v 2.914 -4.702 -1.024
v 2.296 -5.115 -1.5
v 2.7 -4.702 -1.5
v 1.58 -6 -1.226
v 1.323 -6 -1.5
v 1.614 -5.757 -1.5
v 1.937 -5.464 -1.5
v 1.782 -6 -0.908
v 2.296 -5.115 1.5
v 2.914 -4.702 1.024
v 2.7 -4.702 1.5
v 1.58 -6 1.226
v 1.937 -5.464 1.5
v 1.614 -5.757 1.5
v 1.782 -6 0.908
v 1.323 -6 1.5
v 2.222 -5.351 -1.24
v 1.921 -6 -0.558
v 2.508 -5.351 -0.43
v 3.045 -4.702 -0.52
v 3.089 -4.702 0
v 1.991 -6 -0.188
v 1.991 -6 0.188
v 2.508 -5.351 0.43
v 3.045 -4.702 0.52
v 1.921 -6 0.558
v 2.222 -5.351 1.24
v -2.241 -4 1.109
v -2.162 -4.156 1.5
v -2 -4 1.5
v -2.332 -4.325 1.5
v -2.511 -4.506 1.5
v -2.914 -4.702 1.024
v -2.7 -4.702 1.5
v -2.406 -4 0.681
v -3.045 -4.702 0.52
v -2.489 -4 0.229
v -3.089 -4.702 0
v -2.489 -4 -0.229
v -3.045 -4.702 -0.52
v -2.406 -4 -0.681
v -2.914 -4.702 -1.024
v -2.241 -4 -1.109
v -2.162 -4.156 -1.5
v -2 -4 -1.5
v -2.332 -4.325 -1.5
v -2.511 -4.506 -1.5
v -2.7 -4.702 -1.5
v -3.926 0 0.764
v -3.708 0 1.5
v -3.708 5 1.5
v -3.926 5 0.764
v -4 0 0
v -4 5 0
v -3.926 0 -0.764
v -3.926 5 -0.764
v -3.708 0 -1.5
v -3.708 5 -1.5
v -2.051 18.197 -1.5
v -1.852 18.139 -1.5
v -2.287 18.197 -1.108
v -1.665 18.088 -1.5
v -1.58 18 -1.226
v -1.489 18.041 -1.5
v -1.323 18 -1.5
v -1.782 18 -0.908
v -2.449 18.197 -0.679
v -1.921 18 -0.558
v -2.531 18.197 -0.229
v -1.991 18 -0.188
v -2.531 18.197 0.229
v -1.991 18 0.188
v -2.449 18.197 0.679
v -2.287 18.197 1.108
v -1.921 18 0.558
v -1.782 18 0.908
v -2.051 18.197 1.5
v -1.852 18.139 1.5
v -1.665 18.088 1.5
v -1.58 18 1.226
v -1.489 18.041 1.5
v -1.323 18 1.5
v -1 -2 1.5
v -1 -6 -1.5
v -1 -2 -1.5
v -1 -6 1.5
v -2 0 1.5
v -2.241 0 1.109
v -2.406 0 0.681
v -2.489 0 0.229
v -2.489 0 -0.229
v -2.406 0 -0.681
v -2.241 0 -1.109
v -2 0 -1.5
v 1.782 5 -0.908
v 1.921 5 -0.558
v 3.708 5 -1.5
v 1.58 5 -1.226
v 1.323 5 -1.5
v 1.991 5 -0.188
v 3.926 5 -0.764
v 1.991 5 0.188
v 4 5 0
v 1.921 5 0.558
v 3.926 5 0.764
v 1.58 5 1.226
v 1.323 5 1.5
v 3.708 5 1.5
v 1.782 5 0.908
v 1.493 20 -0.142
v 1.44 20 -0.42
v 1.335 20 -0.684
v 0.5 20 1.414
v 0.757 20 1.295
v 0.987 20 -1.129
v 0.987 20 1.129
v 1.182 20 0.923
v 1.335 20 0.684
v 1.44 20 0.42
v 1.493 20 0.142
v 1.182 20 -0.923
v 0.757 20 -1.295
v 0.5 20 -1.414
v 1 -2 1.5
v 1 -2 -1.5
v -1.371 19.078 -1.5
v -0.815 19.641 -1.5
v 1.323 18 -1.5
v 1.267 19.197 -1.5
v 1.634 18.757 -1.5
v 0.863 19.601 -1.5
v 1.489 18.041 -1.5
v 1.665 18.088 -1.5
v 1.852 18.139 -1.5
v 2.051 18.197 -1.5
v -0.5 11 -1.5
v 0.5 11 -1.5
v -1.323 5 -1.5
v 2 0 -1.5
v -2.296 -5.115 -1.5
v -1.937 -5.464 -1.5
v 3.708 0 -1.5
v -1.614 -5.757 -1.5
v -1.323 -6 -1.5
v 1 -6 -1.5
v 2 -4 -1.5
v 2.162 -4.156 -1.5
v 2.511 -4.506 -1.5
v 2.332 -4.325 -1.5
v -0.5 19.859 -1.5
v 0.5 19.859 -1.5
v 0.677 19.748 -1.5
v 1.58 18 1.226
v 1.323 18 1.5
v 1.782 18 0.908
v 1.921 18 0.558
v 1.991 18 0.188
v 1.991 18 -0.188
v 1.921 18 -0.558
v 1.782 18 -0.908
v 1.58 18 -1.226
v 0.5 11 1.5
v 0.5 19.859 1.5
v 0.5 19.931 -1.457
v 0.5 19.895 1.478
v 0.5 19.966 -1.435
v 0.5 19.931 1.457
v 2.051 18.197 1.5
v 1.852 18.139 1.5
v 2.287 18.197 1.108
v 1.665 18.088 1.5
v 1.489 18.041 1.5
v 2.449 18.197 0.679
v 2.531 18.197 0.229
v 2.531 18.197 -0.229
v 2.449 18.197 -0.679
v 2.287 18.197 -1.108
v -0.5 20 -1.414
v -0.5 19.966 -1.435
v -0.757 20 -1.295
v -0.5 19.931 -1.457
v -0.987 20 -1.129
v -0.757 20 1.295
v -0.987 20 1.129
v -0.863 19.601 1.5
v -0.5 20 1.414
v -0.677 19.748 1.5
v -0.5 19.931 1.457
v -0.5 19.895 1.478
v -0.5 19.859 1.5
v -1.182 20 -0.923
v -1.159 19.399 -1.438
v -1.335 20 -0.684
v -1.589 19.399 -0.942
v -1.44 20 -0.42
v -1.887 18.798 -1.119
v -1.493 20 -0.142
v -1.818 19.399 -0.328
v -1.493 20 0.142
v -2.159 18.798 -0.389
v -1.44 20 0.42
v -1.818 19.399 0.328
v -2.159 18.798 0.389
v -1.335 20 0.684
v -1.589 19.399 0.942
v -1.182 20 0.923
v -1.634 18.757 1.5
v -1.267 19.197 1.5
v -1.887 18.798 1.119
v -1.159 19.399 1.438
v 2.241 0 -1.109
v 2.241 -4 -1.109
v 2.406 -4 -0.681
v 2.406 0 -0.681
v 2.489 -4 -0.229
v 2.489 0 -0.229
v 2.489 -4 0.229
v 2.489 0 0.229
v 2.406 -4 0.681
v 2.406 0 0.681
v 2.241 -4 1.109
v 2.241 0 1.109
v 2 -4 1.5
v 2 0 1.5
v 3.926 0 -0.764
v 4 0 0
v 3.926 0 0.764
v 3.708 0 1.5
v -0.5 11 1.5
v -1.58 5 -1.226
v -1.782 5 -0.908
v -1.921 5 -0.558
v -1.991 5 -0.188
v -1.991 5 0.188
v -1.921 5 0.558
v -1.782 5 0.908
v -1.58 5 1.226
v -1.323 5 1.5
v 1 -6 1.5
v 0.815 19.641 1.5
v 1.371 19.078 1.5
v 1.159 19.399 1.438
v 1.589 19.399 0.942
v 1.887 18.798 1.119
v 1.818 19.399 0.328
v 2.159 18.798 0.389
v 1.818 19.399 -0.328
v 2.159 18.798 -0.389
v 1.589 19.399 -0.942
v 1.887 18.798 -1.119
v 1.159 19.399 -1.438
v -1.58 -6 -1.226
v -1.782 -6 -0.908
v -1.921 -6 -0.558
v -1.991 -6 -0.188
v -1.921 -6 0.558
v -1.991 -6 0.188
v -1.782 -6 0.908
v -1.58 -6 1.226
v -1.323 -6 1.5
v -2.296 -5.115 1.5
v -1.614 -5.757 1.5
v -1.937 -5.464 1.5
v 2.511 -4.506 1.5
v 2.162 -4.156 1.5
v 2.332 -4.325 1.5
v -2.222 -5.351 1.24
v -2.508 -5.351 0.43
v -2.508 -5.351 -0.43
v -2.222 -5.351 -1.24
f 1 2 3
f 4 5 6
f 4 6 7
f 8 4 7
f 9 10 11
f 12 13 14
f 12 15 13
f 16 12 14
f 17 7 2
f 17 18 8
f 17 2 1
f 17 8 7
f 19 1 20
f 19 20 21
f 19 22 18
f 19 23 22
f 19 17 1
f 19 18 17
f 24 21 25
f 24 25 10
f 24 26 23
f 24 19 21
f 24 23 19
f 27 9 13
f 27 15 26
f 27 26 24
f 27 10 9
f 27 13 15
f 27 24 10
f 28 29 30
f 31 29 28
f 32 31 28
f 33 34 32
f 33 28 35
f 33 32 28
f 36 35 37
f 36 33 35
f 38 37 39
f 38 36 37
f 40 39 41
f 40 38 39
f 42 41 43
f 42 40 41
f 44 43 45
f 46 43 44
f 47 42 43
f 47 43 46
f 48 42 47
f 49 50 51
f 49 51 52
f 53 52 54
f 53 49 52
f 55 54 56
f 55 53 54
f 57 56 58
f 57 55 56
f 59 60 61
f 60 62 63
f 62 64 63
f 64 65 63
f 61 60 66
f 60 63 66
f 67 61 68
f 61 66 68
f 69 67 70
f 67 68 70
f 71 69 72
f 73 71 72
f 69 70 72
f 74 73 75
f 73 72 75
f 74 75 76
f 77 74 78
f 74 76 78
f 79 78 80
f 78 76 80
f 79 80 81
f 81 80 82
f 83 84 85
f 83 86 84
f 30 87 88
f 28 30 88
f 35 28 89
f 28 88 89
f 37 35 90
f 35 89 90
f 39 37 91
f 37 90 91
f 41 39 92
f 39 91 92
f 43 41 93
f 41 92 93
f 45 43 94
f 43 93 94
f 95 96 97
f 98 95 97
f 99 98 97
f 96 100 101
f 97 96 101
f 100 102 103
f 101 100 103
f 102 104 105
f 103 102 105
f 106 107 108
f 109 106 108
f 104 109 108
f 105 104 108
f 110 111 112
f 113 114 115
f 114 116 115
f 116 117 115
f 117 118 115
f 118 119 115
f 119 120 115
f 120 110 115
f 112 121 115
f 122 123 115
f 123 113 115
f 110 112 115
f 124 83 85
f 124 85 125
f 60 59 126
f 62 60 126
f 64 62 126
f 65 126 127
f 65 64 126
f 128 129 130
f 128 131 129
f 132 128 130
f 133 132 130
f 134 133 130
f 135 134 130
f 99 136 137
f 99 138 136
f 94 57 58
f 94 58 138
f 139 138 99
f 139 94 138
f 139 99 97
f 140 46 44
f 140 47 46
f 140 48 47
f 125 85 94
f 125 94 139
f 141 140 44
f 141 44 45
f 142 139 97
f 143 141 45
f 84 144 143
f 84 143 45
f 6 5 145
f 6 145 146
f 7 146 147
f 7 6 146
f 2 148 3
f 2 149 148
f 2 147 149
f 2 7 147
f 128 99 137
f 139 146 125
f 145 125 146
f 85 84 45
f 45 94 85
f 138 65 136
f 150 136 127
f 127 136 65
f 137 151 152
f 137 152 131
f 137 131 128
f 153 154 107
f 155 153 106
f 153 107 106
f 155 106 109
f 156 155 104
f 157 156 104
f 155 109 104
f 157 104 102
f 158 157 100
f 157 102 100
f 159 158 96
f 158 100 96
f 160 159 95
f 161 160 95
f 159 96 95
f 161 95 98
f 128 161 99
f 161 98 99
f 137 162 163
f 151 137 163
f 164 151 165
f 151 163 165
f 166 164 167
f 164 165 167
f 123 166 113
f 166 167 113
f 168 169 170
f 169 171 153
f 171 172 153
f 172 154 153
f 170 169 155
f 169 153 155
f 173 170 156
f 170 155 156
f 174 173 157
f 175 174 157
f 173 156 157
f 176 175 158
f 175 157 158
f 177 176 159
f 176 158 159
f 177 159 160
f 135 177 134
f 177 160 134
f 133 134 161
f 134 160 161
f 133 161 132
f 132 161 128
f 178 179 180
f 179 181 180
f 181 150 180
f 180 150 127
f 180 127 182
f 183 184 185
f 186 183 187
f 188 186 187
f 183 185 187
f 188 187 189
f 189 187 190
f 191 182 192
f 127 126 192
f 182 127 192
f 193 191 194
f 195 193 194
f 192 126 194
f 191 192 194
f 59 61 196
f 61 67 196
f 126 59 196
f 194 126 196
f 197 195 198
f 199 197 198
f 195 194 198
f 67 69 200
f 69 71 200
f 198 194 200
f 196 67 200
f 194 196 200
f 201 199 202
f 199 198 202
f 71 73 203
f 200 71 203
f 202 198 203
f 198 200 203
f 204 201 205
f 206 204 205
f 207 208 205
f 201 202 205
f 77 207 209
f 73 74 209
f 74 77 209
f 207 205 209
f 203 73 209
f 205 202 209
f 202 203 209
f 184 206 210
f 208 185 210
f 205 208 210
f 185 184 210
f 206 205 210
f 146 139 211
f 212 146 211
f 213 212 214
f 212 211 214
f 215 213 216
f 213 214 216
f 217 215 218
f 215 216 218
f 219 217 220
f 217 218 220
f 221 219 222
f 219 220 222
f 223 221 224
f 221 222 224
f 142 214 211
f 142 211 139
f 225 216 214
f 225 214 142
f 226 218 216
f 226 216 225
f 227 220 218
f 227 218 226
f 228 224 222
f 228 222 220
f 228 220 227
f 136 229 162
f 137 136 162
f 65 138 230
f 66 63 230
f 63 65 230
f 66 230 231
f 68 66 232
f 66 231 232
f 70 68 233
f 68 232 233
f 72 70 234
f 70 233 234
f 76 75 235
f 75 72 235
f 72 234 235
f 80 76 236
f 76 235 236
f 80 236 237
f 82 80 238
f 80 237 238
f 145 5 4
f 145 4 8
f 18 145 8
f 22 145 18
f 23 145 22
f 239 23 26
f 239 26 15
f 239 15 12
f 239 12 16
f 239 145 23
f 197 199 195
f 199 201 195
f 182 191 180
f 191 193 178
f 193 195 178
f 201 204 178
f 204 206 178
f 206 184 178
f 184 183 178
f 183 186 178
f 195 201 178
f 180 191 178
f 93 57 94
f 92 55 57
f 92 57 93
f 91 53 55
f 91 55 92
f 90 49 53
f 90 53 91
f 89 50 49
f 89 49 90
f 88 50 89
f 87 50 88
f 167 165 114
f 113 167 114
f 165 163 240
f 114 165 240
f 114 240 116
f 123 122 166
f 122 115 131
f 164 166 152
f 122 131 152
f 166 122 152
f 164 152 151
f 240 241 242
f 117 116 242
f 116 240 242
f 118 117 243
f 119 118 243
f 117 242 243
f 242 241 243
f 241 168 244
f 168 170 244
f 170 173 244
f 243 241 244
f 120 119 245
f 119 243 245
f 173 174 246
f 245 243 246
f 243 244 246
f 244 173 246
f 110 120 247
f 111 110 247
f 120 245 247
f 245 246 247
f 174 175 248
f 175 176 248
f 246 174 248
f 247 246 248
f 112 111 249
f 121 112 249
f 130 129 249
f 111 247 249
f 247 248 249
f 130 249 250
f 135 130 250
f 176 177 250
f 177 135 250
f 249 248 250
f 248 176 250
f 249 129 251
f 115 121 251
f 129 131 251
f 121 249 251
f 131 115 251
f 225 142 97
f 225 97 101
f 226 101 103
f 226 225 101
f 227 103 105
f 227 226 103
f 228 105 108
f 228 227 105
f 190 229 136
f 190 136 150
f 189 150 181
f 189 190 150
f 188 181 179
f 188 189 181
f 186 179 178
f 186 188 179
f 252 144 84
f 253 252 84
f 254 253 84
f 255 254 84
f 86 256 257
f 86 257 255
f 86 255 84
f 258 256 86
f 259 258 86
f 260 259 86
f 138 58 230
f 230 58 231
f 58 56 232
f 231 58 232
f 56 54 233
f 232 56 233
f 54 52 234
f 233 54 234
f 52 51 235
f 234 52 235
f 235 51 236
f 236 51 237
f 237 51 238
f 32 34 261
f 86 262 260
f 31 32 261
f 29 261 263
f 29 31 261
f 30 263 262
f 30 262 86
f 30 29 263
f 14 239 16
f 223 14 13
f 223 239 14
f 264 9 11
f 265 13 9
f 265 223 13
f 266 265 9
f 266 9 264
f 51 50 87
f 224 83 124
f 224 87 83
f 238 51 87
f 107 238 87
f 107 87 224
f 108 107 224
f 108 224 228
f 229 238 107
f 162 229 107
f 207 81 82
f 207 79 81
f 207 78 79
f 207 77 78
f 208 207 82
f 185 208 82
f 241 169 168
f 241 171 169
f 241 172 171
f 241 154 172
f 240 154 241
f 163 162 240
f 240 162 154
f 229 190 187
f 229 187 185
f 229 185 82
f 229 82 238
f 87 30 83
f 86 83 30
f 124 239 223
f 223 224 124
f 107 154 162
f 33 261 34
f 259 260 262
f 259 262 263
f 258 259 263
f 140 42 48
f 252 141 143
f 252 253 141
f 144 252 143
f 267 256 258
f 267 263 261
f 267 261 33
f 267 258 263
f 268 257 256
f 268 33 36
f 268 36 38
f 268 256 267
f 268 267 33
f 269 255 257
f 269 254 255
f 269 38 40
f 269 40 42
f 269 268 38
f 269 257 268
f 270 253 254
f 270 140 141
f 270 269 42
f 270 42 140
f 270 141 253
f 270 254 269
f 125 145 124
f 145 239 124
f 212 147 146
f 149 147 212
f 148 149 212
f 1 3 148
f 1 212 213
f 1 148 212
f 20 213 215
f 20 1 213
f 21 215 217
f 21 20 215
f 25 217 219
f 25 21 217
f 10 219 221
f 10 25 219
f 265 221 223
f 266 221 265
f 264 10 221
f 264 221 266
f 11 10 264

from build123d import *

# Parameters (mm, degrees)
F15_R     = 2.5
F0_DEPTH  = 4
F3_W      = 2
F3_H      = 7
F4_DEPTH  = 3.5
F5_R      = 4
F6_DEPTH  = 5
F7_R      = 2
F8_DEPTH  = 13
F11_W     = 1
F11_H     = 11
F12_DEPTH = 12.5
F13_W     = 11
F13_H     = 5
F14_DEPTH = 25


with BuildPart() as f0:
    # F15 (on Front) → F0 (new body)
    with BuildSketch(Plane.XZ):
        Circle(F15_R)
    extrude(amount=F0_DEPTH)

    # F1 (on Right) → F2 (revolve)
    with BuildSketch(Plane.YZ):
        Polygon((-6, 0), (-4, 0), (-4, 2.5), (-4.702062, 3.0891), (-6, 2), align=None)
    revolve(axis=Axis((0, -8.987078, 0), (0, -1, 0)))

    # F3 (on Top) → F4 (cut, symmetric)
    with BuildSketch(Plane.XY):
        with Locations((0, -5.5)):
            Rectangle(F3_W, F3_H)
    extrude(amount=F4_DEPTH, both=True, mode=Mode.SUBTRACT)

    # F5 (on face) → F6 (join)
    with BuildSketch(Plane.XZ):
        Circle(F5_R)
    extrude(amount=-F6_DEPTH)

    # F7 (on face) → F8 (join)
    with BuildSketch(Plane(origin=(0, 5, 0), x_dir=(-1, 0, 0), z_dir=(0, 1, 0))):
        Circle(F7_R)
    extrude(amount=F8_DEPTH)

    # F9 (on Right) → F10 (revolve)
    with BuildSketch(Plane.YZ):
        Polygon((18, 2), (18, 0), (20, 0), (20, 1.5), (18.196913, 2.541013), align=None)
    revolve(axis=Axis((0, 19, 0), (0, 1, 0)))

    # F11 (on Top) → F12 (cut, symmetric)
    with BuildSketch(Plane.XY):
        with Locations((0, 16.5)):
            Rectangle(F11_W, F11_H)
    extrude(amount=F12_DEPTH, both=True, mode=Mode.SUBTRACT)

    # F13 (on Front) → F14 (cut, symmetric)
    with BuildSketch(Plane.XZ):
        with Locations((0, 4)):
            Rectangle(F13_W, F13_H)
        with Locations((0, -4)):
            Rectangle(F13_W, F13_H)
    extrude(amount=F14_DEPTH, both=True, mode=Mode.SUBTRACT)


solid = f0.part
